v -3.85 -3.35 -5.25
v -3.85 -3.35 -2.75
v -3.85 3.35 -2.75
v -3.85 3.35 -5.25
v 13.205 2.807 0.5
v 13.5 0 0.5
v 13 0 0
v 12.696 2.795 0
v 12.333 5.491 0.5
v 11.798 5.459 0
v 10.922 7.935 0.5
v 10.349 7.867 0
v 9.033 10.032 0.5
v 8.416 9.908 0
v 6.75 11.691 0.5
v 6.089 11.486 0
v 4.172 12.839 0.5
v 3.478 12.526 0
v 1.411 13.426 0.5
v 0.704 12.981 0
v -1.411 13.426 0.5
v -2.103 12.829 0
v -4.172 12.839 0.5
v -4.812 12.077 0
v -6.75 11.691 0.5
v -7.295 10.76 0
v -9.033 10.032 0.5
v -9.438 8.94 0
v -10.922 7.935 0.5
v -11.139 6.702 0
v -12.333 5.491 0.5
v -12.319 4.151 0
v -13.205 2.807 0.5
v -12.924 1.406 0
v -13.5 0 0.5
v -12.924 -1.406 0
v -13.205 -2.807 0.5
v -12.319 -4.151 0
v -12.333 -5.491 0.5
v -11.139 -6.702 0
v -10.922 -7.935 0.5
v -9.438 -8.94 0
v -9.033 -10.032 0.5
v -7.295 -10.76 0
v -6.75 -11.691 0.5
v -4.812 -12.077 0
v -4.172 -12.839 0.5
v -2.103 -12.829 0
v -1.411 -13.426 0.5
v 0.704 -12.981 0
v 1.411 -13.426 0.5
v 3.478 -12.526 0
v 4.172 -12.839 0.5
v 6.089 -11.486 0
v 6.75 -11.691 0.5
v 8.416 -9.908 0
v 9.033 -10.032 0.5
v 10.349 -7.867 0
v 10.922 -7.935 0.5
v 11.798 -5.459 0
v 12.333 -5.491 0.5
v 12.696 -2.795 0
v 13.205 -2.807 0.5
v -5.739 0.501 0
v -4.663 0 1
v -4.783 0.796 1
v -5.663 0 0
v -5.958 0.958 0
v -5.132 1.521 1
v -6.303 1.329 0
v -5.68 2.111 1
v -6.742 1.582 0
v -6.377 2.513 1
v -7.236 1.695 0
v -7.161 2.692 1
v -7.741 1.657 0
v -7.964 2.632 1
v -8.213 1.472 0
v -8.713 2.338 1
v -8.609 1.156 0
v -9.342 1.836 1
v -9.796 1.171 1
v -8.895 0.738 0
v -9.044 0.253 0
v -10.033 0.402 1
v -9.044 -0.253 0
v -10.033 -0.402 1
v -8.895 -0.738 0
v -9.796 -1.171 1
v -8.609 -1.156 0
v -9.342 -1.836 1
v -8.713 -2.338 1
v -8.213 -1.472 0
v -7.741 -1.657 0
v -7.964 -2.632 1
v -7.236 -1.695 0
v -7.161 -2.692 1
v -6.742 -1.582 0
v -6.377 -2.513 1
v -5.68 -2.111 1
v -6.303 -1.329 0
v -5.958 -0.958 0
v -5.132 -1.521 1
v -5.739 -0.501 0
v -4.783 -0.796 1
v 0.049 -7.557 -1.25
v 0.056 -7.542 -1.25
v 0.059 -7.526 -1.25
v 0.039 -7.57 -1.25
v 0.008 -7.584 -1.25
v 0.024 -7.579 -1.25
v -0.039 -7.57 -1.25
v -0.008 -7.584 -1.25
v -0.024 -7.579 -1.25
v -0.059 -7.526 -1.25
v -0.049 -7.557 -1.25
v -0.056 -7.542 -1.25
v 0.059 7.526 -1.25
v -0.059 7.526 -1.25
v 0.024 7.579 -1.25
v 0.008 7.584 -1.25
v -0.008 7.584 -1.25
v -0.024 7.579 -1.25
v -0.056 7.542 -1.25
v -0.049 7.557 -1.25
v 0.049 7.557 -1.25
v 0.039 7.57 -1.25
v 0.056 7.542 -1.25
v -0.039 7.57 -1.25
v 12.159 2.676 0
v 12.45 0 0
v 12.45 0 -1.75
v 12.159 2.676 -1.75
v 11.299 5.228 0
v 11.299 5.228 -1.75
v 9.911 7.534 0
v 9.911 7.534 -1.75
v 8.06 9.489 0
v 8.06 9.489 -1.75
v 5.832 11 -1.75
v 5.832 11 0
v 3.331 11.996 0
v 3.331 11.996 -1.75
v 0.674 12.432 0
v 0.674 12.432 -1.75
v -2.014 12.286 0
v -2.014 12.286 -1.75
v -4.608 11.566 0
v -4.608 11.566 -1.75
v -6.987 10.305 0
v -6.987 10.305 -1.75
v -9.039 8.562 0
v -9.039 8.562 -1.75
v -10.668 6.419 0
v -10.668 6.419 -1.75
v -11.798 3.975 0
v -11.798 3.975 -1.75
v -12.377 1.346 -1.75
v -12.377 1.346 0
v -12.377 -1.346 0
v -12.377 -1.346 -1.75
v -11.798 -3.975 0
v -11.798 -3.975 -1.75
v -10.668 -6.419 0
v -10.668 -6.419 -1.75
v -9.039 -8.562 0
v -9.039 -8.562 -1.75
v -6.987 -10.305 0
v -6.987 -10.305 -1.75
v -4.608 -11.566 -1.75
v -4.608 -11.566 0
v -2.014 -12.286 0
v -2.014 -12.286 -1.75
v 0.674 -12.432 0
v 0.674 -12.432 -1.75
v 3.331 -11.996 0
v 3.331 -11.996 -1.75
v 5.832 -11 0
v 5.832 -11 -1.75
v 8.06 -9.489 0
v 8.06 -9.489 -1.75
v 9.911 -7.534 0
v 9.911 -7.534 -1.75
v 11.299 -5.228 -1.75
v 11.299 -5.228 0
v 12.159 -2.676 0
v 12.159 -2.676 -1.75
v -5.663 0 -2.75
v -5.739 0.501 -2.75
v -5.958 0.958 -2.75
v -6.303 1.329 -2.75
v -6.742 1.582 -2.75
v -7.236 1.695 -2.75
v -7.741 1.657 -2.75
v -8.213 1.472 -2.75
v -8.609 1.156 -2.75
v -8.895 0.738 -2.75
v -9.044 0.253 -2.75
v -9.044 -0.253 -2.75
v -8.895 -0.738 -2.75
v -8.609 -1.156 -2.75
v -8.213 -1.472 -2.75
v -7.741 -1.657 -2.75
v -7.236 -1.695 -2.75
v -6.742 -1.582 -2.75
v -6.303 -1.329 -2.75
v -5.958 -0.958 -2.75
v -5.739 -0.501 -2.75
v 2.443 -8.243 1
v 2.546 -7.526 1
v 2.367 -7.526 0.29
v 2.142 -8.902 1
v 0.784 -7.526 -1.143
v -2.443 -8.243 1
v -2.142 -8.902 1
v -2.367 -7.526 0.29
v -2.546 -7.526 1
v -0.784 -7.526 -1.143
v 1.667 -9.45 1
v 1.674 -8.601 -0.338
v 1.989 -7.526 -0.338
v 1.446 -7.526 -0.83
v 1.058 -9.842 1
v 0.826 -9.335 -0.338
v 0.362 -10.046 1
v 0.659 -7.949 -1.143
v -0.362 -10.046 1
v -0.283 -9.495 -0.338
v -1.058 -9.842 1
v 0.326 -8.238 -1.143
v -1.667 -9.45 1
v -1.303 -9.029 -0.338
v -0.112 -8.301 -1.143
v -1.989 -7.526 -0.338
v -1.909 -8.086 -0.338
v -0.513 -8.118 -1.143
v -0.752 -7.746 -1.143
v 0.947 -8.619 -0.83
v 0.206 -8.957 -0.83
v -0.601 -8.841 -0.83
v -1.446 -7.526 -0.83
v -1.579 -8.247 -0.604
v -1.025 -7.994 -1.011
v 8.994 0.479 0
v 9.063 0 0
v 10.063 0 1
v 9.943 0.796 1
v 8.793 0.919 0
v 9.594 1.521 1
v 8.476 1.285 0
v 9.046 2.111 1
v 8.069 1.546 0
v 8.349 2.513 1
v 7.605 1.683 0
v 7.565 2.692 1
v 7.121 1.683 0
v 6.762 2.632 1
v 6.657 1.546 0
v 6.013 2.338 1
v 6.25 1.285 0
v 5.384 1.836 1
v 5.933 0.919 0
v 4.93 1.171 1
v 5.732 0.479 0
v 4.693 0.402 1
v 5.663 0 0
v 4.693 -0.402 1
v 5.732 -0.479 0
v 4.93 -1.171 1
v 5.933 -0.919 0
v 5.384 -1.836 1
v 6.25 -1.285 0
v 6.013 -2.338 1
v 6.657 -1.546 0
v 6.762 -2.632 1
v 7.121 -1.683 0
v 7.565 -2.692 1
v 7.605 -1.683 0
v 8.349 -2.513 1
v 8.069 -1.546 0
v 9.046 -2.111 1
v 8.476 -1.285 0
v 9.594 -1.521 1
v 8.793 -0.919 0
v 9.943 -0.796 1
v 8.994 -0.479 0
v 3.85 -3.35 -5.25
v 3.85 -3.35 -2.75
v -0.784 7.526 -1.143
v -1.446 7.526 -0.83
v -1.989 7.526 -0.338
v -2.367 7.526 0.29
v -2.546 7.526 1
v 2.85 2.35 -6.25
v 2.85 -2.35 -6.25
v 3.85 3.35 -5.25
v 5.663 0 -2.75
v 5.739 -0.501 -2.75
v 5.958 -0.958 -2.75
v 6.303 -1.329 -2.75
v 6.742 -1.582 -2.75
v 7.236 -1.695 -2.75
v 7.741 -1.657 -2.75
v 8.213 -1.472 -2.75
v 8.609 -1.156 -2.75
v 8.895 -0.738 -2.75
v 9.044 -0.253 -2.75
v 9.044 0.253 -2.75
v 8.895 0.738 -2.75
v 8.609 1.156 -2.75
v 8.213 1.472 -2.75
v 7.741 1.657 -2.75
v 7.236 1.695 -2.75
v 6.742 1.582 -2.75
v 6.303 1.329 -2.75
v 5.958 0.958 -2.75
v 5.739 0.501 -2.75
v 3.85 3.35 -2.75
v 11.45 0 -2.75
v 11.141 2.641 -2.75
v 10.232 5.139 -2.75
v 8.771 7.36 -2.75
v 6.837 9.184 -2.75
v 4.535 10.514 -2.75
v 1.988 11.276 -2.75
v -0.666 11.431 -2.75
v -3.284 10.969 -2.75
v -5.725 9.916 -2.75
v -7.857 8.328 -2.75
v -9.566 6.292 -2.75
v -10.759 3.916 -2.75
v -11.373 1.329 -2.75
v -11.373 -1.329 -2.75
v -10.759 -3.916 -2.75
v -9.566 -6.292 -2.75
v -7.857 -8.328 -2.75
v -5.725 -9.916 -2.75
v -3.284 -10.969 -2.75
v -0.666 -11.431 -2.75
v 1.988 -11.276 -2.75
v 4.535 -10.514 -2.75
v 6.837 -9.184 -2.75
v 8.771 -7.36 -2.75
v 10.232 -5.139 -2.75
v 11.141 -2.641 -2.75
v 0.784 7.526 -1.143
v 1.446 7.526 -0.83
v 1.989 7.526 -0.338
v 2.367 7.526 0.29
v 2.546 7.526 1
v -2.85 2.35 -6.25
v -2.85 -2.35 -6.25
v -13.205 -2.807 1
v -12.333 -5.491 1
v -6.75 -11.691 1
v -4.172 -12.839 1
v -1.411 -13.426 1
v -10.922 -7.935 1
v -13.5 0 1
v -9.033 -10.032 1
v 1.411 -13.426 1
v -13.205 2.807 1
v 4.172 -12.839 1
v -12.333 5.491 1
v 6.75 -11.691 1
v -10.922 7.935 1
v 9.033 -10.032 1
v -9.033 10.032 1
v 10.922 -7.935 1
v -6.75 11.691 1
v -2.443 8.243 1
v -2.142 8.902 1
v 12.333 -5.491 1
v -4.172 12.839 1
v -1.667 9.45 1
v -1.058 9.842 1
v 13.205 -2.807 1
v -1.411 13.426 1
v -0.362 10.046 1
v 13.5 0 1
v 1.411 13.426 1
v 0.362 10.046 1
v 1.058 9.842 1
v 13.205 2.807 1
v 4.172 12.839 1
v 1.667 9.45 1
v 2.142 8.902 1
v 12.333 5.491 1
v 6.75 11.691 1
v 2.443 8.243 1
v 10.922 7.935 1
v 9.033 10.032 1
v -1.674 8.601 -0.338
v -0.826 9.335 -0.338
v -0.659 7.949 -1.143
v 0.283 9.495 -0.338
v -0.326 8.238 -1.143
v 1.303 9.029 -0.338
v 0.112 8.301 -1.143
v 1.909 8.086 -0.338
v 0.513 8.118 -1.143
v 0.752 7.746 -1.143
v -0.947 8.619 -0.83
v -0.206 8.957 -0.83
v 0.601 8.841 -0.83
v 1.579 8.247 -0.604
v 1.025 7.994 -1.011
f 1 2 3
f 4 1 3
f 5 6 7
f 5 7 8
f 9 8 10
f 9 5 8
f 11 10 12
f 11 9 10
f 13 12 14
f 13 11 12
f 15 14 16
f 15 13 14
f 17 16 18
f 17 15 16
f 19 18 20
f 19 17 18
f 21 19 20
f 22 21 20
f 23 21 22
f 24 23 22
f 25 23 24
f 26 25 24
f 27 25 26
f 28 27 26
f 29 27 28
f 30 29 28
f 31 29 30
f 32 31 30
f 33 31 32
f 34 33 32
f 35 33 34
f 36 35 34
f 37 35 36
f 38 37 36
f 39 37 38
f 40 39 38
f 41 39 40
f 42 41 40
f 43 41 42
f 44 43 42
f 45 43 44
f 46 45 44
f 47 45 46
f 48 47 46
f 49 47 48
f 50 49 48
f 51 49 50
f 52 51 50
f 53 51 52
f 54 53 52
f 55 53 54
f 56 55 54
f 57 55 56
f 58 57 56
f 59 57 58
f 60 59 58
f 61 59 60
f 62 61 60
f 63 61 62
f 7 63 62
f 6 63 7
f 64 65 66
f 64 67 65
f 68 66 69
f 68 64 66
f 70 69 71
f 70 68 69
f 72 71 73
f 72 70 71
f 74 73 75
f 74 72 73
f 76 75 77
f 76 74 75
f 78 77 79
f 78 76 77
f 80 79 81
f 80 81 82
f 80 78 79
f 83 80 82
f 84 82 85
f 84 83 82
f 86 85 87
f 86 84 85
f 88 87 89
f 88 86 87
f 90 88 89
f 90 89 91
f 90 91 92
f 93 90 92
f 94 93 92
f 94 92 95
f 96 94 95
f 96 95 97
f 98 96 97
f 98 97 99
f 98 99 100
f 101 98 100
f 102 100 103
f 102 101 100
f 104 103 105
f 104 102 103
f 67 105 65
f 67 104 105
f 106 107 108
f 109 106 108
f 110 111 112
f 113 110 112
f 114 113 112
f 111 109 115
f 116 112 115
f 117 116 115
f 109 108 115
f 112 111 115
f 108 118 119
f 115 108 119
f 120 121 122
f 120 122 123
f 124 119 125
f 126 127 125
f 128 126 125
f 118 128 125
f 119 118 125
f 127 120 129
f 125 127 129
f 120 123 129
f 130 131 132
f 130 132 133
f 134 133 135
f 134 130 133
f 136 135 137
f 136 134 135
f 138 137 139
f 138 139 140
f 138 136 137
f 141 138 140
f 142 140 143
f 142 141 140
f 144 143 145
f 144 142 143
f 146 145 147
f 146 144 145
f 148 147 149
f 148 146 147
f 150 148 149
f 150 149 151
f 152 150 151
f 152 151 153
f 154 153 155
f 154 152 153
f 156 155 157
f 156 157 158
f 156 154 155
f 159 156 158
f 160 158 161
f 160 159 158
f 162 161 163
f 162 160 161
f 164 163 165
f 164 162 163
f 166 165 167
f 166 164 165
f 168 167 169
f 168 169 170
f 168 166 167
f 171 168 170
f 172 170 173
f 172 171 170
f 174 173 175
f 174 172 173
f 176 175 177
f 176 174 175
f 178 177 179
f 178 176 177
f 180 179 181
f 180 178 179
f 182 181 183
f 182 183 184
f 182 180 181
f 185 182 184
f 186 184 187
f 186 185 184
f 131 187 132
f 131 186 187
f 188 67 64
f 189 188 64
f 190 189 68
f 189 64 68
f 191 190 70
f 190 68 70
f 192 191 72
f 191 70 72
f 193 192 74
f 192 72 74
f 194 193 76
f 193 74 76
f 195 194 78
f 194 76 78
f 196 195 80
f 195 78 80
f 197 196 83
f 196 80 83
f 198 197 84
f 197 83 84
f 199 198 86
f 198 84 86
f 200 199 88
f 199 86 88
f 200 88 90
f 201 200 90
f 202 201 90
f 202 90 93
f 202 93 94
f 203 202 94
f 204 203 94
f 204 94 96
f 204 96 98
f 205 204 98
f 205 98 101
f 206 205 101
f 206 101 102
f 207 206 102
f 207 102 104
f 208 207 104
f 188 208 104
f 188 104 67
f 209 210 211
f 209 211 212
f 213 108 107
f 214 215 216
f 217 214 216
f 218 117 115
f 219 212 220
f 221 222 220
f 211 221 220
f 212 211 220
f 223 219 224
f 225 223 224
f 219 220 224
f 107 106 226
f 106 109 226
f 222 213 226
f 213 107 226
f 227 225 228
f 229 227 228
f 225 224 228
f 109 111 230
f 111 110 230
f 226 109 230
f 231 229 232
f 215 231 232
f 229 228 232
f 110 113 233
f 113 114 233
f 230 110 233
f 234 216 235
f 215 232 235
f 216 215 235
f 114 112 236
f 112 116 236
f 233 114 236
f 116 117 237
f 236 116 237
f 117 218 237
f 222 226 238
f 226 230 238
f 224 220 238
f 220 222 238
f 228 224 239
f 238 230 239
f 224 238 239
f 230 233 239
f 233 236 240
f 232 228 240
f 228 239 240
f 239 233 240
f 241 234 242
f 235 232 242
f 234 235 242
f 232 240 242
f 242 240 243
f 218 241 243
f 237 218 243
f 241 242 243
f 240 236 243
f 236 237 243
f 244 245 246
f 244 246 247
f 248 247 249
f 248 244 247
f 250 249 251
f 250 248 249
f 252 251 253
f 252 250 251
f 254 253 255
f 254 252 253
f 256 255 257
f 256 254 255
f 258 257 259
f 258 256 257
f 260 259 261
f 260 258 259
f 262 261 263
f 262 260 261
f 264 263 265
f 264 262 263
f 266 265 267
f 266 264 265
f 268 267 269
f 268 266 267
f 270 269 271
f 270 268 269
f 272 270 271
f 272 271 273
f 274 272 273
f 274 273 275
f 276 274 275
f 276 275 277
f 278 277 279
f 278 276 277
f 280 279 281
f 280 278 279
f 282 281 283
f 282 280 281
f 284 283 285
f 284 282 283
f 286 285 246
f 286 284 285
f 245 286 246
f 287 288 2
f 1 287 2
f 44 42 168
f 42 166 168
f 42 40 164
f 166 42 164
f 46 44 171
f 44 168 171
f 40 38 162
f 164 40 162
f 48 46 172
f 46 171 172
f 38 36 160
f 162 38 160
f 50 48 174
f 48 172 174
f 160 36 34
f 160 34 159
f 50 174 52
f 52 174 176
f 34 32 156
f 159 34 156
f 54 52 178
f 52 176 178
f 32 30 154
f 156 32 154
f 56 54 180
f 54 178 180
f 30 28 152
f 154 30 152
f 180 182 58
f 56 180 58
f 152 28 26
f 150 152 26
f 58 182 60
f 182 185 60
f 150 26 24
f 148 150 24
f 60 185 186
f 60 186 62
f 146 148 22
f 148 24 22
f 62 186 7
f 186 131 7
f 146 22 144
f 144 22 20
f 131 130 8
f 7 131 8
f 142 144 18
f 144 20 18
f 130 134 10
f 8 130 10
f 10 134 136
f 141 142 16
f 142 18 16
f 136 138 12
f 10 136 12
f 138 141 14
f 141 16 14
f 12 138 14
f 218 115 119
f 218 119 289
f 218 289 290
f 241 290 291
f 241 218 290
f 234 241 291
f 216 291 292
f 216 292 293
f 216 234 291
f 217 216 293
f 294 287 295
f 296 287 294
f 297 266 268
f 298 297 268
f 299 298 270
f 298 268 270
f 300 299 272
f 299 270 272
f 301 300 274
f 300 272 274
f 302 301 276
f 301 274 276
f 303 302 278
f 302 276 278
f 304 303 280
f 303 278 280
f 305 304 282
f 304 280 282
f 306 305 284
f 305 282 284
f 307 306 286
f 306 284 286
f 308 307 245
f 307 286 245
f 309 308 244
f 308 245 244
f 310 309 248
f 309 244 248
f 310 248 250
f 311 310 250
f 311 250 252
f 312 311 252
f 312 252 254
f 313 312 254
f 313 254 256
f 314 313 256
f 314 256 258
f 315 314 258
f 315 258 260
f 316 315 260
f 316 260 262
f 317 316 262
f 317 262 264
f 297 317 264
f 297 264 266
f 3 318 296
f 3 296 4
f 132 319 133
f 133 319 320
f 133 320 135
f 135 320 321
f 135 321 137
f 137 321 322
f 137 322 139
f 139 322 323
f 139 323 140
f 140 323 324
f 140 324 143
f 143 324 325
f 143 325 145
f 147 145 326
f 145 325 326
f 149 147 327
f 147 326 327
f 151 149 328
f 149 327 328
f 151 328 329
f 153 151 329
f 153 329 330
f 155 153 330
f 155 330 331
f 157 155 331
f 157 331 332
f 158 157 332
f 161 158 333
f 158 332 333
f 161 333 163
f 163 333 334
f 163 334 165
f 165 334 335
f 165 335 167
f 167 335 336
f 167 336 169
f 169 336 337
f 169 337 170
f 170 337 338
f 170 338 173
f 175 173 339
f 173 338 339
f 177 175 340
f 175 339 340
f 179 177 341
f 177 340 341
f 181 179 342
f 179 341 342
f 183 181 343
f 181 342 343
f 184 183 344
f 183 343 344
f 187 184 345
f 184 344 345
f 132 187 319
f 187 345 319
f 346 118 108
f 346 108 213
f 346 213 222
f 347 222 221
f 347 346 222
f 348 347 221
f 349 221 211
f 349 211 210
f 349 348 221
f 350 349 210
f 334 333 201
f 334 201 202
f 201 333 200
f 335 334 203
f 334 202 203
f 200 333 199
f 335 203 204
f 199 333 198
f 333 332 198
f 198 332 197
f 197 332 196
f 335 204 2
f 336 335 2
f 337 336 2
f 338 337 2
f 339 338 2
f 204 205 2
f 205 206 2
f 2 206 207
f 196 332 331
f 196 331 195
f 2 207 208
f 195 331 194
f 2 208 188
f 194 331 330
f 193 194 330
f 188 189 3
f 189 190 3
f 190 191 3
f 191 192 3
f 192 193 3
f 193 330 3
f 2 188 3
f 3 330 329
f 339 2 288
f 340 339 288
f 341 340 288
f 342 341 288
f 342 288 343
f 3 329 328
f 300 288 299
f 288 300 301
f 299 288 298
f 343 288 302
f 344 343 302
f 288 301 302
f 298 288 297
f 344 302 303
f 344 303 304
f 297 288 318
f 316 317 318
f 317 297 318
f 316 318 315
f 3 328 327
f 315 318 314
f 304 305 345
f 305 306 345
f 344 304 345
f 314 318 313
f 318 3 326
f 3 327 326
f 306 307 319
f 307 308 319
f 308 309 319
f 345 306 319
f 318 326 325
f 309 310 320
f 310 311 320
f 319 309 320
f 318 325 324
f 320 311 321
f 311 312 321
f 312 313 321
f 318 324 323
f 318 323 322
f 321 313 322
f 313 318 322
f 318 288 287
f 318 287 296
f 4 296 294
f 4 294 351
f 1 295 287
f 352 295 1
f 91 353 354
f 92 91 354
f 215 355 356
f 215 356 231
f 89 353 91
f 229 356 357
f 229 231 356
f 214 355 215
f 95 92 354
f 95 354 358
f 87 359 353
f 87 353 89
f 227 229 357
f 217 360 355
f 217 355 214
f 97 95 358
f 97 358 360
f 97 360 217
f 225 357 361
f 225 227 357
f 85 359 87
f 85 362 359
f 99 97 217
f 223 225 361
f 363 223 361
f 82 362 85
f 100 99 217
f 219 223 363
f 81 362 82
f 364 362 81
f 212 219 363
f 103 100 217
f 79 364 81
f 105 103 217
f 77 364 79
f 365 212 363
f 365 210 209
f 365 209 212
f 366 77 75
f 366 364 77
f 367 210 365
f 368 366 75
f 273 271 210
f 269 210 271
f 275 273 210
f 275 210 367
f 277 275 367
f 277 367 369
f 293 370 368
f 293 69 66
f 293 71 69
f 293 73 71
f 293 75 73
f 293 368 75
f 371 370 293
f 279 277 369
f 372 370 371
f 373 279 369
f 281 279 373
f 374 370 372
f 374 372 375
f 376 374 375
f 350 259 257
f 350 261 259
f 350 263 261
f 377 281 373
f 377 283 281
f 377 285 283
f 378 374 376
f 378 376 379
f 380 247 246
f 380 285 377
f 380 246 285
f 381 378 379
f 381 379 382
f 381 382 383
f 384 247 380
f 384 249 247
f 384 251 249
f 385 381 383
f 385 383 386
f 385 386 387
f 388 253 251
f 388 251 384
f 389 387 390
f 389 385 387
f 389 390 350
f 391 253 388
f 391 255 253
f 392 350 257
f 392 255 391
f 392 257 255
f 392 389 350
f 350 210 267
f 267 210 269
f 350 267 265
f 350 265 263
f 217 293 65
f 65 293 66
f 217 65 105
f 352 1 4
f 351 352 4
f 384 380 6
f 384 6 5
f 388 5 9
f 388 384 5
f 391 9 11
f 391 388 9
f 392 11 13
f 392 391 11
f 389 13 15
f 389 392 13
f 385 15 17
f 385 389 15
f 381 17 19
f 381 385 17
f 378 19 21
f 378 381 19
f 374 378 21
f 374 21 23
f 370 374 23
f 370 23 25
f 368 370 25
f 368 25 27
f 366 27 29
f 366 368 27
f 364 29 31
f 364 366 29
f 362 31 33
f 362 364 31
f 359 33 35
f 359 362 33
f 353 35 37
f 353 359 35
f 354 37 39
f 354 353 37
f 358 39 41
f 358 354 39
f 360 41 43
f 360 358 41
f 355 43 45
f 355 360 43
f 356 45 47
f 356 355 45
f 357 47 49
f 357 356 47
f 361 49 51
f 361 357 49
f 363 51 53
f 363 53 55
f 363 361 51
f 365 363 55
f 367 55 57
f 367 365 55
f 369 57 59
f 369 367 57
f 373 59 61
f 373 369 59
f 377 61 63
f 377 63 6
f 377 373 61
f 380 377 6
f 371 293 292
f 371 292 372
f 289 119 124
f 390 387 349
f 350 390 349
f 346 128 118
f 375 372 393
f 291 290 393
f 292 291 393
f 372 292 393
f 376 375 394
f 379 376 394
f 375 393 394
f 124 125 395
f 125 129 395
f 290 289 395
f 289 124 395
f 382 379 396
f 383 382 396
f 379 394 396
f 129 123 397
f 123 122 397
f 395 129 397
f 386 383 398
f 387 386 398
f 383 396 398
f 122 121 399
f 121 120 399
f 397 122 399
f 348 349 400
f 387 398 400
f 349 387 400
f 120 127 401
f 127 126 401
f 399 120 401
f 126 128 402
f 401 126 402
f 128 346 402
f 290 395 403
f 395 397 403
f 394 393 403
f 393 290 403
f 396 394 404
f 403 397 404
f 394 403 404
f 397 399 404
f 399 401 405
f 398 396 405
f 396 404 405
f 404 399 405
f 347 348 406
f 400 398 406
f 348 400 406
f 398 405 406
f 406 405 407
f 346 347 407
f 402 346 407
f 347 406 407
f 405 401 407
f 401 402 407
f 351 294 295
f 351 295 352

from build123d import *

# Parameters (mm, degrees)
SKETCH1_R           = 12.45
SKETCH1_R_2         = 1.7
BOSS_EXTRUDE1_DEPTH = 2.75
SKETCH2_W           = 7.7
SKETCH2_H           = 6.7
BOSS_EXTRUDE2_DEPTH = 3.5
BOSS_EXTRUDE3_START = 1
SKETCH3_R           = 13.5
SKETCH3_R_2         = 1.7
BOSS_EXTRUDE3_DEPTH = 1
CHAMFER1_SIZE       = 1
CHAMFER2_SIZE       = 0.5
CUT_EXTRUDE1_DEPTH  = 2.25
FILLET1_R           = 2.5
CHAMFER3_SIZE       = 1


with BuildPart() as part:
    # Sketch1 → Boss-Extrude1 (new body)
    with BuildSketch(Plane.XY):
        Circle(SKETCH1_R)
        with Locations((-7.36300717, 0)):
            Circle(SKETCH1_R_2, mode=Mode.SUBTRACT)
        with Locations(Location((7.36300717, 0, 0), (0, 0, 180))):
            Circle(SKETCH1_R_2, mode=Mode.SUBTRACT)
    extrude(amount=-BOSS_EXTRUDE1_DEPTH)

    # Sketch2 → Boss-Extrude2 (add)
    with BuildSketch(Plane(origin=(0, 0, -2.75), x_dir=(-1, 0, 0), z_dir=(0, 0, -1))):
        Rectangle(SKETCH2_W, SKETCH2_H)
    extrude(amount=BOSS_EXTRUDE2_DEPTH)

    # Sketch3 → Boss-Extrude3 (add)
    with BuildSketch(Plane.XY.offset(BOSS_EXTRUDE3_START)):
        Circle(SKETCH3_R)
        with Locations((-7.36300717, 0)):
            Circle(SKETCH3_R_2, mode=Mode.SUBTRACT)
        with Locations((7.36300717, 0)):
            Circle(SKETCH3_R_2, mode=Mode.SUBTRACT)
    extrude(amount=-BOSS_EXTRUDE3_DEPTH)

    # Chamfer1
    chamfer1_edges = [part.edges().sort_by_distance(p)[0] for p in [
        (-3.85, 0, -6.25),
        (0, 3.35, -6.25),
        (3.85, 0, -6.25),
        (0, -3.35, -6.25),
        (-12.45, 0, -2.75),
    ]]
    chamfer(chamfer1_edges, length=CHAMFER1_SIZE)

    # Chamfer2
    chamfer2_edges = [part.edges().sort_by_distance(p)[0] for p in [
        (-13.5, 0, 0),
    ]]
    chamfer(chamfer2_edges, length=CHAMFER2_SIZE)

    # Sketch4 → Cut-Extrude1 (cut)
    with BuildSketch(Plane.XY.offset(1)):
        with BuildLine():
            Line((2.54627648, 7.525661596), (2.54627648, -7.525661596))
            ThreePointArc((2.54627648, -7.525661596), (0, -10.071938075), (-2.54627648, -7.525661596))
            Line((-2.54627648, -7.525661596), (-2.54627648, 7.525661596))
            ThreePointArc((-2.54627648, 7.525661596), (0, 10.071938075), (2.54627648, 7.525661596))
        make_face()
    extrude(amount=-CUT_EXTRUDE1_DEPTH, mode=Mode.SUBTRACT)

    # Fillet1
    # the kernel refuses this fillet: 2.5 mm, written as the material it adds along each edge
    with BuildSketch(Plane(origin=(-2.54627648, -7.525661596, -1.25), x_dir=(0, 0, 1), z_dir=(0, 1, 0)), Plane(origin=(2.54627648, 7.525661596, -1.25), x_dir=(0, 0, 1), z_dir=(0, -1, 0))) as fillet1_piece_1:
        with BuildLine():
            CenterArc((2.5, 2.487468593), FILLET1_R, 180, 84.260829523)
            Line((0, 2.487468593), (-0.05, 2.487468593))
            Line((-0.05, 2.487468593), (-0.05, 0))
            Line((-0.05, 0), (0, -0.05))
            ThreePointArc((0, -0.05), (1.125, -0.05), (2.245, -0.049749372))
            Line((2.245, -0.049749372), (2.25, 0))
        make_face()
    extrude(amount=15.051323191)
    with BuildSketch(Plane(origin=(0, 7.525661596, -1.25), x_dir=(-1, 0, 0), z_dir=(0, -1, 0))) as fillet1_piece_2:
        with BuildLine():
            CenterArc((0.058807887, -2.5), FILLET1_R, 5.739170477, 84.260829523)
            Line((0.058807887, 0), (0.058807887, 0.05))
            Line((0.058807887, 0.05), (2.54627648, 0.05))
            Line((2.54627648, 0.05), (2.59627648, 0))
            ThreePointArc((2.59627648, 0), (2.59627648, -1.125), (2.596025852, -2.245))
            Line((2.596025852, -2.245), (2.54627648, -2.25))
        make_face()
    revolve(axis=Axis((0, 7.525661596, -1.25), (0, 0, -1)), revolution_arc=180)
    with BuildSketch(Plane(origin=(0, -7.525661596, -1.25), x_dir=(1, 0, 0), z_dir=(0, 1, 0))) as fillet1_piece_3:
        with BuildLine():
            CenterArc((0.058807887, -2.5), FILLET1_R, 5.739170477, 84.260829523)
            Line((0.058807887, 0), (0.058807887, 0.05))
            Line((0.058807887, 0.05), (2.54627648, 0.05))
            Line((2.54627648, 0.05), (2.59627648, 0))
            ThreePointArc((2.59627648, 0), (2.59627648, -1.125), (2.596025852, -2.245))
            Line((2.596025852, -2.245), (2.54627648, -2.25))
        make_face()
    revolve(axis=Axis((0, -7.525661596, -1.25), (0, 0, -1)), revolution_arc=180)

    # Chamfer3
    # the kernel refuses this chamfer: 1 mm, written as the material it takes off along each edge
    with BuildSketch(Plane(origin=(-7.36300717, 0, 1), x_dir=(1, 0, 0), z_dir=(0, -1, 0))) as chamfer3_piece_1:
        Polygon((1.7 + CHAMFER3_SIZE, 0), (1.7, -CHAMFER3_SIZE), (1.7, 0), align=None)
    revolve(axis=Axis((-7.36300717, 0, 1), (0, 0, 1)), mode=Mode.SUBTRACT)
    with BuildSketch(Plane(origin=(7.36300717, 0, 1), x_dir=(1, 0, 0), z_dir=(0, -1, 0))) as chamfer3_piece_2:
        Polygon((1.7 + CHAMFER3_SIZE, 0), (1.7, -CHAMFER3_SIZE), (1.7, 0), align=None)
    revolve(axis=Axis((7.36300717, 0, 1), (0, 0, 1)), mode=Mode.SUBTRACT)


solid = part.part
